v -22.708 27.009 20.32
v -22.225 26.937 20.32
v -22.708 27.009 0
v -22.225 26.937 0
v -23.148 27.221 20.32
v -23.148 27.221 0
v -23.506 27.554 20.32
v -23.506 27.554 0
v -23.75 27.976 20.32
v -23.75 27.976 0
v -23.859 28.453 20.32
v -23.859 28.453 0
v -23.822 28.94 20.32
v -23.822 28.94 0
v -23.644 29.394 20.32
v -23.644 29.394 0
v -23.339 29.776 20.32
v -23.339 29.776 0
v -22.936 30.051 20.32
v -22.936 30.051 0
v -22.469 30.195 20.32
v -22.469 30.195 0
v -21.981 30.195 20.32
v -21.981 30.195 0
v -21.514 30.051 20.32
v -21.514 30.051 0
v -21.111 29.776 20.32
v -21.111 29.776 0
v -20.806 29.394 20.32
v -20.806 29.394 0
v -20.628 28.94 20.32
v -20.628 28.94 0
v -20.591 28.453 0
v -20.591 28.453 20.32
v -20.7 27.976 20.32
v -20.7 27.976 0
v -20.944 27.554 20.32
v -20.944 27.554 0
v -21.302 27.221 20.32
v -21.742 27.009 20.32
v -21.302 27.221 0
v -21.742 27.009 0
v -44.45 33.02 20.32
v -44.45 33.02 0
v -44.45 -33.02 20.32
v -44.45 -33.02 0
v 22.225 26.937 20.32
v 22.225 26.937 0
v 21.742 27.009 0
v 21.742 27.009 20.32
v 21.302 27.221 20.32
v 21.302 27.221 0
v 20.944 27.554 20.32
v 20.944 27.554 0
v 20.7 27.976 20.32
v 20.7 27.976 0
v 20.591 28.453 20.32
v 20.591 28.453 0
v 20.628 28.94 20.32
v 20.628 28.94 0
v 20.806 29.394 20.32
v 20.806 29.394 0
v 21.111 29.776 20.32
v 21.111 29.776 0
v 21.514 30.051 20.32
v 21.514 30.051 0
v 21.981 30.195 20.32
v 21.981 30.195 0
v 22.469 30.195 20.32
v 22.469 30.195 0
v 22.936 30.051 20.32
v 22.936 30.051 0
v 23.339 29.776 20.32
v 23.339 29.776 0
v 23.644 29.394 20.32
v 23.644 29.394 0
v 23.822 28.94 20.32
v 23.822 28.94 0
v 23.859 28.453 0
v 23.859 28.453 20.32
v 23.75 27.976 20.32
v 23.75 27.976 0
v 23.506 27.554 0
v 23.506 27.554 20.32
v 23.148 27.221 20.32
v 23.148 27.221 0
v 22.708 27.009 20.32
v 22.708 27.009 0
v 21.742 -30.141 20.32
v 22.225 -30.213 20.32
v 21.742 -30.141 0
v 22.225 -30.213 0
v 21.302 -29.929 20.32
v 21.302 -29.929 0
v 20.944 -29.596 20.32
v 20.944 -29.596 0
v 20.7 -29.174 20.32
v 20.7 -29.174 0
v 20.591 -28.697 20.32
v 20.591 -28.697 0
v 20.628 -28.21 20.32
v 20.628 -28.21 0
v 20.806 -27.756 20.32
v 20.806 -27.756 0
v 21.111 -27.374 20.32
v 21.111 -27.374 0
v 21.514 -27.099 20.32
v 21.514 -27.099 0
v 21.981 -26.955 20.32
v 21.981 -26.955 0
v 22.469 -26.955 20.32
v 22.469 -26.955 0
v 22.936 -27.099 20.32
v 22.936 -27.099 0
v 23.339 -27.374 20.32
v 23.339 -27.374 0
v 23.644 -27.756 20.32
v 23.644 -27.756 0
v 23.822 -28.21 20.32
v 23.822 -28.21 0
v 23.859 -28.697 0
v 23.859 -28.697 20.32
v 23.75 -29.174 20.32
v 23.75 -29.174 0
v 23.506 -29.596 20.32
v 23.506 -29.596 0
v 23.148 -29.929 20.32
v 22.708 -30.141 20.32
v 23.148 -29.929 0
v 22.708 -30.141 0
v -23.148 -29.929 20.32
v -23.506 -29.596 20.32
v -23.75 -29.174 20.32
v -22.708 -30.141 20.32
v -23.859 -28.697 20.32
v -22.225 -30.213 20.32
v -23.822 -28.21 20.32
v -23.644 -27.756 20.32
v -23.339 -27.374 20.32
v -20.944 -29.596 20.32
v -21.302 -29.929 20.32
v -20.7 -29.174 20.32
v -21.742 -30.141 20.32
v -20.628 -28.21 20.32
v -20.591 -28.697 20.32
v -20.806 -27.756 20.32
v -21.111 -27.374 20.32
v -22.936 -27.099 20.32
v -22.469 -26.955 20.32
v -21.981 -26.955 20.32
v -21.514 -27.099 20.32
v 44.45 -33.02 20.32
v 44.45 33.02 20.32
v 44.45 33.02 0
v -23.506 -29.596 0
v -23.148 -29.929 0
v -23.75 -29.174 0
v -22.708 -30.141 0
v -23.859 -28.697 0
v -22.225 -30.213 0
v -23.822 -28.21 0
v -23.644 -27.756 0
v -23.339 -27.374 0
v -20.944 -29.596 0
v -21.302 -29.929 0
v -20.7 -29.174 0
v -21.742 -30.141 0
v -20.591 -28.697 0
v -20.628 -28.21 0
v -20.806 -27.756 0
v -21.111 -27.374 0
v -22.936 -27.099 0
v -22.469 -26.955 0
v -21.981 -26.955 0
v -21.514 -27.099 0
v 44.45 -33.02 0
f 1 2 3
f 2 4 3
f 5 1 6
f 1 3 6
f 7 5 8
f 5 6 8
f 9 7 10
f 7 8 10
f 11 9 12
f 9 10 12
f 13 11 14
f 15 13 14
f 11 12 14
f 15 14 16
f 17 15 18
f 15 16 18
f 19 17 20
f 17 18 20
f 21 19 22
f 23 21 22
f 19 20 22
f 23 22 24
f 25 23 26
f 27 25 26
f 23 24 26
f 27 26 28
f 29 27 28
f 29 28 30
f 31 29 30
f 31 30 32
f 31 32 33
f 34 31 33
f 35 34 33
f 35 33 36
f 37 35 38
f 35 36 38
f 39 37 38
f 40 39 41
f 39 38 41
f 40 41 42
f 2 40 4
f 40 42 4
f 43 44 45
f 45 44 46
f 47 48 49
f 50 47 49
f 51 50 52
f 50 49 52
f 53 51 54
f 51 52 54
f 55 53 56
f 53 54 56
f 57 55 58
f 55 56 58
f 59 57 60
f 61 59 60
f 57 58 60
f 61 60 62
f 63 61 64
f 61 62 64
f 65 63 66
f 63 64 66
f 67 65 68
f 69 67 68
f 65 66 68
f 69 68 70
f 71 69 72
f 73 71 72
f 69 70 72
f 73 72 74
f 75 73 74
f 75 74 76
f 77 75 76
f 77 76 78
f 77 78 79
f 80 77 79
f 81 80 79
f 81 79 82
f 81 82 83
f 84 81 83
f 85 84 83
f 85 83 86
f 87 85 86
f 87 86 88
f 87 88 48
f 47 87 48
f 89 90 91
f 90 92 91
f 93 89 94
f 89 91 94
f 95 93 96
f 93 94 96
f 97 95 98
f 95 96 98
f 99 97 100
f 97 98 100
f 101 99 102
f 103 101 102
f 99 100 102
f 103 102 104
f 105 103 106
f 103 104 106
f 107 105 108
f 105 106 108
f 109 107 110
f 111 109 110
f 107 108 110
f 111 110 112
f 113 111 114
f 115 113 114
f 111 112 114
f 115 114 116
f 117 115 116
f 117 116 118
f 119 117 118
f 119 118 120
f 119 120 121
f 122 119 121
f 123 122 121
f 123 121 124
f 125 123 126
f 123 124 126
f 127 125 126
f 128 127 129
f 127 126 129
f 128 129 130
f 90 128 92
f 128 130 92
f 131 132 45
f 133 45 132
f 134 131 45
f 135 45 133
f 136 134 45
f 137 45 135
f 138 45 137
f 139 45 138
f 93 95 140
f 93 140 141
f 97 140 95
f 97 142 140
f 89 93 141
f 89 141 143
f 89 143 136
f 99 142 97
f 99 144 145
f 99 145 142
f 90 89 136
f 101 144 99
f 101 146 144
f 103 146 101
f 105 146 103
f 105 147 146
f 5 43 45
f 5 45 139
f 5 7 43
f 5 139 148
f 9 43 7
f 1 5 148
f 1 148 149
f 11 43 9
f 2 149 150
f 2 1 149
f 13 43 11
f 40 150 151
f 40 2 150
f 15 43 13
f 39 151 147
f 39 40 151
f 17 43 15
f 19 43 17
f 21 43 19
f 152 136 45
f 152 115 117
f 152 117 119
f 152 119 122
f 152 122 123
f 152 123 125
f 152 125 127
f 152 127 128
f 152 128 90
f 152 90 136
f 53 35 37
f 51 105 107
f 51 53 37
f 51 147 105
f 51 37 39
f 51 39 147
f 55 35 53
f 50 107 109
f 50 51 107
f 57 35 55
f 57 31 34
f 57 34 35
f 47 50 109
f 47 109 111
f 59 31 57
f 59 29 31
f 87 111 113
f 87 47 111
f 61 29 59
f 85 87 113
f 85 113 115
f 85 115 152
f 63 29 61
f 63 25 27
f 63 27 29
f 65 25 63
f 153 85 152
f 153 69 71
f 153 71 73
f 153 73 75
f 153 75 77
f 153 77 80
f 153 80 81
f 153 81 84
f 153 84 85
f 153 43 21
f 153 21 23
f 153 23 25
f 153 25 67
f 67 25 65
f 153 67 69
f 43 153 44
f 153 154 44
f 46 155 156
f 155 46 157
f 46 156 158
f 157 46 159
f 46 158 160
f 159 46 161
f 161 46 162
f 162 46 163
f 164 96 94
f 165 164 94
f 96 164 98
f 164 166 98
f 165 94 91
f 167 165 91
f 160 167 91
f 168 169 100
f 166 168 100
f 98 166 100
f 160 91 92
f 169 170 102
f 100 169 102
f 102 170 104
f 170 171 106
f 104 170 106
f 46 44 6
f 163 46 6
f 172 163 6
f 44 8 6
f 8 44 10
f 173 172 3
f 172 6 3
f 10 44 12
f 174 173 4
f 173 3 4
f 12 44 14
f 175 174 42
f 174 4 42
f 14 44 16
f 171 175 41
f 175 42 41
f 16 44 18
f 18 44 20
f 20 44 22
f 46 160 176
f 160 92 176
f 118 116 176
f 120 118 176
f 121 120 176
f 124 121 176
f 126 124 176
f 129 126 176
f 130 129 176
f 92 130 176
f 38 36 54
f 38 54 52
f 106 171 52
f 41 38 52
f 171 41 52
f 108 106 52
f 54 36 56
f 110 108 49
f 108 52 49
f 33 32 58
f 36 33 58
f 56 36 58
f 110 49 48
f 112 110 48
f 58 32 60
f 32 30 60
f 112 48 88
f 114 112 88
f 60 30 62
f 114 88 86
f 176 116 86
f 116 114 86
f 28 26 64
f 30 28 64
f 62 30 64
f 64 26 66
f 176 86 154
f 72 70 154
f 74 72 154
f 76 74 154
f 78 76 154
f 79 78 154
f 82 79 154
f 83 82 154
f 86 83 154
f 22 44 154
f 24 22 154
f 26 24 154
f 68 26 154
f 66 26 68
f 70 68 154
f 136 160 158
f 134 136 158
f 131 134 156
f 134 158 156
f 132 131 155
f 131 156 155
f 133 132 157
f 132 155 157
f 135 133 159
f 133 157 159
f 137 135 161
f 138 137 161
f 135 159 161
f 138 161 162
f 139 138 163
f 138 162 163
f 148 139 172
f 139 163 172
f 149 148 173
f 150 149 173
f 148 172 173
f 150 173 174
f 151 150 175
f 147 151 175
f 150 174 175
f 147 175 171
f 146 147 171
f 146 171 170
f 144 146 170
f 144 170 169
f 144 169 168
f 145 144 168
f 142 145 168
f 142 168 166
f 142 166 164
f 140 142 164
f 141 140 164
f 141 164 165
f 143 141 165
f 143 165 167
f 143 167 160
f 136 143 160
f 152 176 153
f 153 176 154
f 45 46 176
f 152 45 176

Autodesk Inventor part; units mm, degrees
ref_plane "YZ Plane" through (0, 0, 0) normal (1, 0, 0) x (0, 1, 0)
ref_plane "XZ Plane" through (0, 0, 0) normal (0, 1, 0) x (-1, 0, 0)
ref_plane "XY Plane" through (0, 0, 0) normal (0, 0, 1) x (1, 0, 0)
sketch "Sketch1" plane through (0, 0, 0) normal (0, 0, 1) x (1, 0, 0)
  line L0 (-44.45, -33.02) -> (44.45, -33.02)
  line L1 (44.45, -33.02) -> (44.45, 33.02)
  line L2 (44.45, 33.02) -> (-44.45, 33.02)
  line L3 (-44.45, 33.02) -> (-44.45, -33.02)
  point P0 (0, 0)
  point P1 (44.45, 0)
  point P2 (0, 33.02)
  dimension "d0" = 88.9
  dimension "d1" = 66.04
extrude "Extrusion1" add sketch "Sketch1" along normal blind 20.32
sketch "Sketch2" plane through (0, 0, 20.32) normal (0, 0, 1) x (1, 0, 0)
  line L0 (-44.45, -33.02) -> (-44.45, 33.02) projected
  line L1 (-44.45, 33.02) -> (44.45, 33.02) projected
  line L2 (-22.225, 28.575) -> (22.225, 28.575)
  line L3 (22.225, 28.575) -> (22.225, -28.575)
  line L4 (22.225, -28.575) -> (-22.225, -28.575)
  line L5 (-22.225, -28.575) -> (-22.225, 28.575)
  point P0 (0, 0)
  point P1 (-22.225, 0)
  point P2 (-44.45, 0)
  point P3 (0, 28.575)
  point P4 (0, 33.02)
  dimension "d4" = 44.45
  dimension "d5" = 57.15
hole "Hole1" at (-22.225, 28.575, 20.32) at (-22.225, -28.575, 20.32) at (22.225, 28.575, 20.32) at (22.225, -28.575, 20.32) direction (0, 0, -1) diameter 3.2766 end through all clearance for "Flat Head Machine Screw (82)" size "#4" standard "Ansi Unified Screw Threads"
properties part number "sabertooth keepout"
